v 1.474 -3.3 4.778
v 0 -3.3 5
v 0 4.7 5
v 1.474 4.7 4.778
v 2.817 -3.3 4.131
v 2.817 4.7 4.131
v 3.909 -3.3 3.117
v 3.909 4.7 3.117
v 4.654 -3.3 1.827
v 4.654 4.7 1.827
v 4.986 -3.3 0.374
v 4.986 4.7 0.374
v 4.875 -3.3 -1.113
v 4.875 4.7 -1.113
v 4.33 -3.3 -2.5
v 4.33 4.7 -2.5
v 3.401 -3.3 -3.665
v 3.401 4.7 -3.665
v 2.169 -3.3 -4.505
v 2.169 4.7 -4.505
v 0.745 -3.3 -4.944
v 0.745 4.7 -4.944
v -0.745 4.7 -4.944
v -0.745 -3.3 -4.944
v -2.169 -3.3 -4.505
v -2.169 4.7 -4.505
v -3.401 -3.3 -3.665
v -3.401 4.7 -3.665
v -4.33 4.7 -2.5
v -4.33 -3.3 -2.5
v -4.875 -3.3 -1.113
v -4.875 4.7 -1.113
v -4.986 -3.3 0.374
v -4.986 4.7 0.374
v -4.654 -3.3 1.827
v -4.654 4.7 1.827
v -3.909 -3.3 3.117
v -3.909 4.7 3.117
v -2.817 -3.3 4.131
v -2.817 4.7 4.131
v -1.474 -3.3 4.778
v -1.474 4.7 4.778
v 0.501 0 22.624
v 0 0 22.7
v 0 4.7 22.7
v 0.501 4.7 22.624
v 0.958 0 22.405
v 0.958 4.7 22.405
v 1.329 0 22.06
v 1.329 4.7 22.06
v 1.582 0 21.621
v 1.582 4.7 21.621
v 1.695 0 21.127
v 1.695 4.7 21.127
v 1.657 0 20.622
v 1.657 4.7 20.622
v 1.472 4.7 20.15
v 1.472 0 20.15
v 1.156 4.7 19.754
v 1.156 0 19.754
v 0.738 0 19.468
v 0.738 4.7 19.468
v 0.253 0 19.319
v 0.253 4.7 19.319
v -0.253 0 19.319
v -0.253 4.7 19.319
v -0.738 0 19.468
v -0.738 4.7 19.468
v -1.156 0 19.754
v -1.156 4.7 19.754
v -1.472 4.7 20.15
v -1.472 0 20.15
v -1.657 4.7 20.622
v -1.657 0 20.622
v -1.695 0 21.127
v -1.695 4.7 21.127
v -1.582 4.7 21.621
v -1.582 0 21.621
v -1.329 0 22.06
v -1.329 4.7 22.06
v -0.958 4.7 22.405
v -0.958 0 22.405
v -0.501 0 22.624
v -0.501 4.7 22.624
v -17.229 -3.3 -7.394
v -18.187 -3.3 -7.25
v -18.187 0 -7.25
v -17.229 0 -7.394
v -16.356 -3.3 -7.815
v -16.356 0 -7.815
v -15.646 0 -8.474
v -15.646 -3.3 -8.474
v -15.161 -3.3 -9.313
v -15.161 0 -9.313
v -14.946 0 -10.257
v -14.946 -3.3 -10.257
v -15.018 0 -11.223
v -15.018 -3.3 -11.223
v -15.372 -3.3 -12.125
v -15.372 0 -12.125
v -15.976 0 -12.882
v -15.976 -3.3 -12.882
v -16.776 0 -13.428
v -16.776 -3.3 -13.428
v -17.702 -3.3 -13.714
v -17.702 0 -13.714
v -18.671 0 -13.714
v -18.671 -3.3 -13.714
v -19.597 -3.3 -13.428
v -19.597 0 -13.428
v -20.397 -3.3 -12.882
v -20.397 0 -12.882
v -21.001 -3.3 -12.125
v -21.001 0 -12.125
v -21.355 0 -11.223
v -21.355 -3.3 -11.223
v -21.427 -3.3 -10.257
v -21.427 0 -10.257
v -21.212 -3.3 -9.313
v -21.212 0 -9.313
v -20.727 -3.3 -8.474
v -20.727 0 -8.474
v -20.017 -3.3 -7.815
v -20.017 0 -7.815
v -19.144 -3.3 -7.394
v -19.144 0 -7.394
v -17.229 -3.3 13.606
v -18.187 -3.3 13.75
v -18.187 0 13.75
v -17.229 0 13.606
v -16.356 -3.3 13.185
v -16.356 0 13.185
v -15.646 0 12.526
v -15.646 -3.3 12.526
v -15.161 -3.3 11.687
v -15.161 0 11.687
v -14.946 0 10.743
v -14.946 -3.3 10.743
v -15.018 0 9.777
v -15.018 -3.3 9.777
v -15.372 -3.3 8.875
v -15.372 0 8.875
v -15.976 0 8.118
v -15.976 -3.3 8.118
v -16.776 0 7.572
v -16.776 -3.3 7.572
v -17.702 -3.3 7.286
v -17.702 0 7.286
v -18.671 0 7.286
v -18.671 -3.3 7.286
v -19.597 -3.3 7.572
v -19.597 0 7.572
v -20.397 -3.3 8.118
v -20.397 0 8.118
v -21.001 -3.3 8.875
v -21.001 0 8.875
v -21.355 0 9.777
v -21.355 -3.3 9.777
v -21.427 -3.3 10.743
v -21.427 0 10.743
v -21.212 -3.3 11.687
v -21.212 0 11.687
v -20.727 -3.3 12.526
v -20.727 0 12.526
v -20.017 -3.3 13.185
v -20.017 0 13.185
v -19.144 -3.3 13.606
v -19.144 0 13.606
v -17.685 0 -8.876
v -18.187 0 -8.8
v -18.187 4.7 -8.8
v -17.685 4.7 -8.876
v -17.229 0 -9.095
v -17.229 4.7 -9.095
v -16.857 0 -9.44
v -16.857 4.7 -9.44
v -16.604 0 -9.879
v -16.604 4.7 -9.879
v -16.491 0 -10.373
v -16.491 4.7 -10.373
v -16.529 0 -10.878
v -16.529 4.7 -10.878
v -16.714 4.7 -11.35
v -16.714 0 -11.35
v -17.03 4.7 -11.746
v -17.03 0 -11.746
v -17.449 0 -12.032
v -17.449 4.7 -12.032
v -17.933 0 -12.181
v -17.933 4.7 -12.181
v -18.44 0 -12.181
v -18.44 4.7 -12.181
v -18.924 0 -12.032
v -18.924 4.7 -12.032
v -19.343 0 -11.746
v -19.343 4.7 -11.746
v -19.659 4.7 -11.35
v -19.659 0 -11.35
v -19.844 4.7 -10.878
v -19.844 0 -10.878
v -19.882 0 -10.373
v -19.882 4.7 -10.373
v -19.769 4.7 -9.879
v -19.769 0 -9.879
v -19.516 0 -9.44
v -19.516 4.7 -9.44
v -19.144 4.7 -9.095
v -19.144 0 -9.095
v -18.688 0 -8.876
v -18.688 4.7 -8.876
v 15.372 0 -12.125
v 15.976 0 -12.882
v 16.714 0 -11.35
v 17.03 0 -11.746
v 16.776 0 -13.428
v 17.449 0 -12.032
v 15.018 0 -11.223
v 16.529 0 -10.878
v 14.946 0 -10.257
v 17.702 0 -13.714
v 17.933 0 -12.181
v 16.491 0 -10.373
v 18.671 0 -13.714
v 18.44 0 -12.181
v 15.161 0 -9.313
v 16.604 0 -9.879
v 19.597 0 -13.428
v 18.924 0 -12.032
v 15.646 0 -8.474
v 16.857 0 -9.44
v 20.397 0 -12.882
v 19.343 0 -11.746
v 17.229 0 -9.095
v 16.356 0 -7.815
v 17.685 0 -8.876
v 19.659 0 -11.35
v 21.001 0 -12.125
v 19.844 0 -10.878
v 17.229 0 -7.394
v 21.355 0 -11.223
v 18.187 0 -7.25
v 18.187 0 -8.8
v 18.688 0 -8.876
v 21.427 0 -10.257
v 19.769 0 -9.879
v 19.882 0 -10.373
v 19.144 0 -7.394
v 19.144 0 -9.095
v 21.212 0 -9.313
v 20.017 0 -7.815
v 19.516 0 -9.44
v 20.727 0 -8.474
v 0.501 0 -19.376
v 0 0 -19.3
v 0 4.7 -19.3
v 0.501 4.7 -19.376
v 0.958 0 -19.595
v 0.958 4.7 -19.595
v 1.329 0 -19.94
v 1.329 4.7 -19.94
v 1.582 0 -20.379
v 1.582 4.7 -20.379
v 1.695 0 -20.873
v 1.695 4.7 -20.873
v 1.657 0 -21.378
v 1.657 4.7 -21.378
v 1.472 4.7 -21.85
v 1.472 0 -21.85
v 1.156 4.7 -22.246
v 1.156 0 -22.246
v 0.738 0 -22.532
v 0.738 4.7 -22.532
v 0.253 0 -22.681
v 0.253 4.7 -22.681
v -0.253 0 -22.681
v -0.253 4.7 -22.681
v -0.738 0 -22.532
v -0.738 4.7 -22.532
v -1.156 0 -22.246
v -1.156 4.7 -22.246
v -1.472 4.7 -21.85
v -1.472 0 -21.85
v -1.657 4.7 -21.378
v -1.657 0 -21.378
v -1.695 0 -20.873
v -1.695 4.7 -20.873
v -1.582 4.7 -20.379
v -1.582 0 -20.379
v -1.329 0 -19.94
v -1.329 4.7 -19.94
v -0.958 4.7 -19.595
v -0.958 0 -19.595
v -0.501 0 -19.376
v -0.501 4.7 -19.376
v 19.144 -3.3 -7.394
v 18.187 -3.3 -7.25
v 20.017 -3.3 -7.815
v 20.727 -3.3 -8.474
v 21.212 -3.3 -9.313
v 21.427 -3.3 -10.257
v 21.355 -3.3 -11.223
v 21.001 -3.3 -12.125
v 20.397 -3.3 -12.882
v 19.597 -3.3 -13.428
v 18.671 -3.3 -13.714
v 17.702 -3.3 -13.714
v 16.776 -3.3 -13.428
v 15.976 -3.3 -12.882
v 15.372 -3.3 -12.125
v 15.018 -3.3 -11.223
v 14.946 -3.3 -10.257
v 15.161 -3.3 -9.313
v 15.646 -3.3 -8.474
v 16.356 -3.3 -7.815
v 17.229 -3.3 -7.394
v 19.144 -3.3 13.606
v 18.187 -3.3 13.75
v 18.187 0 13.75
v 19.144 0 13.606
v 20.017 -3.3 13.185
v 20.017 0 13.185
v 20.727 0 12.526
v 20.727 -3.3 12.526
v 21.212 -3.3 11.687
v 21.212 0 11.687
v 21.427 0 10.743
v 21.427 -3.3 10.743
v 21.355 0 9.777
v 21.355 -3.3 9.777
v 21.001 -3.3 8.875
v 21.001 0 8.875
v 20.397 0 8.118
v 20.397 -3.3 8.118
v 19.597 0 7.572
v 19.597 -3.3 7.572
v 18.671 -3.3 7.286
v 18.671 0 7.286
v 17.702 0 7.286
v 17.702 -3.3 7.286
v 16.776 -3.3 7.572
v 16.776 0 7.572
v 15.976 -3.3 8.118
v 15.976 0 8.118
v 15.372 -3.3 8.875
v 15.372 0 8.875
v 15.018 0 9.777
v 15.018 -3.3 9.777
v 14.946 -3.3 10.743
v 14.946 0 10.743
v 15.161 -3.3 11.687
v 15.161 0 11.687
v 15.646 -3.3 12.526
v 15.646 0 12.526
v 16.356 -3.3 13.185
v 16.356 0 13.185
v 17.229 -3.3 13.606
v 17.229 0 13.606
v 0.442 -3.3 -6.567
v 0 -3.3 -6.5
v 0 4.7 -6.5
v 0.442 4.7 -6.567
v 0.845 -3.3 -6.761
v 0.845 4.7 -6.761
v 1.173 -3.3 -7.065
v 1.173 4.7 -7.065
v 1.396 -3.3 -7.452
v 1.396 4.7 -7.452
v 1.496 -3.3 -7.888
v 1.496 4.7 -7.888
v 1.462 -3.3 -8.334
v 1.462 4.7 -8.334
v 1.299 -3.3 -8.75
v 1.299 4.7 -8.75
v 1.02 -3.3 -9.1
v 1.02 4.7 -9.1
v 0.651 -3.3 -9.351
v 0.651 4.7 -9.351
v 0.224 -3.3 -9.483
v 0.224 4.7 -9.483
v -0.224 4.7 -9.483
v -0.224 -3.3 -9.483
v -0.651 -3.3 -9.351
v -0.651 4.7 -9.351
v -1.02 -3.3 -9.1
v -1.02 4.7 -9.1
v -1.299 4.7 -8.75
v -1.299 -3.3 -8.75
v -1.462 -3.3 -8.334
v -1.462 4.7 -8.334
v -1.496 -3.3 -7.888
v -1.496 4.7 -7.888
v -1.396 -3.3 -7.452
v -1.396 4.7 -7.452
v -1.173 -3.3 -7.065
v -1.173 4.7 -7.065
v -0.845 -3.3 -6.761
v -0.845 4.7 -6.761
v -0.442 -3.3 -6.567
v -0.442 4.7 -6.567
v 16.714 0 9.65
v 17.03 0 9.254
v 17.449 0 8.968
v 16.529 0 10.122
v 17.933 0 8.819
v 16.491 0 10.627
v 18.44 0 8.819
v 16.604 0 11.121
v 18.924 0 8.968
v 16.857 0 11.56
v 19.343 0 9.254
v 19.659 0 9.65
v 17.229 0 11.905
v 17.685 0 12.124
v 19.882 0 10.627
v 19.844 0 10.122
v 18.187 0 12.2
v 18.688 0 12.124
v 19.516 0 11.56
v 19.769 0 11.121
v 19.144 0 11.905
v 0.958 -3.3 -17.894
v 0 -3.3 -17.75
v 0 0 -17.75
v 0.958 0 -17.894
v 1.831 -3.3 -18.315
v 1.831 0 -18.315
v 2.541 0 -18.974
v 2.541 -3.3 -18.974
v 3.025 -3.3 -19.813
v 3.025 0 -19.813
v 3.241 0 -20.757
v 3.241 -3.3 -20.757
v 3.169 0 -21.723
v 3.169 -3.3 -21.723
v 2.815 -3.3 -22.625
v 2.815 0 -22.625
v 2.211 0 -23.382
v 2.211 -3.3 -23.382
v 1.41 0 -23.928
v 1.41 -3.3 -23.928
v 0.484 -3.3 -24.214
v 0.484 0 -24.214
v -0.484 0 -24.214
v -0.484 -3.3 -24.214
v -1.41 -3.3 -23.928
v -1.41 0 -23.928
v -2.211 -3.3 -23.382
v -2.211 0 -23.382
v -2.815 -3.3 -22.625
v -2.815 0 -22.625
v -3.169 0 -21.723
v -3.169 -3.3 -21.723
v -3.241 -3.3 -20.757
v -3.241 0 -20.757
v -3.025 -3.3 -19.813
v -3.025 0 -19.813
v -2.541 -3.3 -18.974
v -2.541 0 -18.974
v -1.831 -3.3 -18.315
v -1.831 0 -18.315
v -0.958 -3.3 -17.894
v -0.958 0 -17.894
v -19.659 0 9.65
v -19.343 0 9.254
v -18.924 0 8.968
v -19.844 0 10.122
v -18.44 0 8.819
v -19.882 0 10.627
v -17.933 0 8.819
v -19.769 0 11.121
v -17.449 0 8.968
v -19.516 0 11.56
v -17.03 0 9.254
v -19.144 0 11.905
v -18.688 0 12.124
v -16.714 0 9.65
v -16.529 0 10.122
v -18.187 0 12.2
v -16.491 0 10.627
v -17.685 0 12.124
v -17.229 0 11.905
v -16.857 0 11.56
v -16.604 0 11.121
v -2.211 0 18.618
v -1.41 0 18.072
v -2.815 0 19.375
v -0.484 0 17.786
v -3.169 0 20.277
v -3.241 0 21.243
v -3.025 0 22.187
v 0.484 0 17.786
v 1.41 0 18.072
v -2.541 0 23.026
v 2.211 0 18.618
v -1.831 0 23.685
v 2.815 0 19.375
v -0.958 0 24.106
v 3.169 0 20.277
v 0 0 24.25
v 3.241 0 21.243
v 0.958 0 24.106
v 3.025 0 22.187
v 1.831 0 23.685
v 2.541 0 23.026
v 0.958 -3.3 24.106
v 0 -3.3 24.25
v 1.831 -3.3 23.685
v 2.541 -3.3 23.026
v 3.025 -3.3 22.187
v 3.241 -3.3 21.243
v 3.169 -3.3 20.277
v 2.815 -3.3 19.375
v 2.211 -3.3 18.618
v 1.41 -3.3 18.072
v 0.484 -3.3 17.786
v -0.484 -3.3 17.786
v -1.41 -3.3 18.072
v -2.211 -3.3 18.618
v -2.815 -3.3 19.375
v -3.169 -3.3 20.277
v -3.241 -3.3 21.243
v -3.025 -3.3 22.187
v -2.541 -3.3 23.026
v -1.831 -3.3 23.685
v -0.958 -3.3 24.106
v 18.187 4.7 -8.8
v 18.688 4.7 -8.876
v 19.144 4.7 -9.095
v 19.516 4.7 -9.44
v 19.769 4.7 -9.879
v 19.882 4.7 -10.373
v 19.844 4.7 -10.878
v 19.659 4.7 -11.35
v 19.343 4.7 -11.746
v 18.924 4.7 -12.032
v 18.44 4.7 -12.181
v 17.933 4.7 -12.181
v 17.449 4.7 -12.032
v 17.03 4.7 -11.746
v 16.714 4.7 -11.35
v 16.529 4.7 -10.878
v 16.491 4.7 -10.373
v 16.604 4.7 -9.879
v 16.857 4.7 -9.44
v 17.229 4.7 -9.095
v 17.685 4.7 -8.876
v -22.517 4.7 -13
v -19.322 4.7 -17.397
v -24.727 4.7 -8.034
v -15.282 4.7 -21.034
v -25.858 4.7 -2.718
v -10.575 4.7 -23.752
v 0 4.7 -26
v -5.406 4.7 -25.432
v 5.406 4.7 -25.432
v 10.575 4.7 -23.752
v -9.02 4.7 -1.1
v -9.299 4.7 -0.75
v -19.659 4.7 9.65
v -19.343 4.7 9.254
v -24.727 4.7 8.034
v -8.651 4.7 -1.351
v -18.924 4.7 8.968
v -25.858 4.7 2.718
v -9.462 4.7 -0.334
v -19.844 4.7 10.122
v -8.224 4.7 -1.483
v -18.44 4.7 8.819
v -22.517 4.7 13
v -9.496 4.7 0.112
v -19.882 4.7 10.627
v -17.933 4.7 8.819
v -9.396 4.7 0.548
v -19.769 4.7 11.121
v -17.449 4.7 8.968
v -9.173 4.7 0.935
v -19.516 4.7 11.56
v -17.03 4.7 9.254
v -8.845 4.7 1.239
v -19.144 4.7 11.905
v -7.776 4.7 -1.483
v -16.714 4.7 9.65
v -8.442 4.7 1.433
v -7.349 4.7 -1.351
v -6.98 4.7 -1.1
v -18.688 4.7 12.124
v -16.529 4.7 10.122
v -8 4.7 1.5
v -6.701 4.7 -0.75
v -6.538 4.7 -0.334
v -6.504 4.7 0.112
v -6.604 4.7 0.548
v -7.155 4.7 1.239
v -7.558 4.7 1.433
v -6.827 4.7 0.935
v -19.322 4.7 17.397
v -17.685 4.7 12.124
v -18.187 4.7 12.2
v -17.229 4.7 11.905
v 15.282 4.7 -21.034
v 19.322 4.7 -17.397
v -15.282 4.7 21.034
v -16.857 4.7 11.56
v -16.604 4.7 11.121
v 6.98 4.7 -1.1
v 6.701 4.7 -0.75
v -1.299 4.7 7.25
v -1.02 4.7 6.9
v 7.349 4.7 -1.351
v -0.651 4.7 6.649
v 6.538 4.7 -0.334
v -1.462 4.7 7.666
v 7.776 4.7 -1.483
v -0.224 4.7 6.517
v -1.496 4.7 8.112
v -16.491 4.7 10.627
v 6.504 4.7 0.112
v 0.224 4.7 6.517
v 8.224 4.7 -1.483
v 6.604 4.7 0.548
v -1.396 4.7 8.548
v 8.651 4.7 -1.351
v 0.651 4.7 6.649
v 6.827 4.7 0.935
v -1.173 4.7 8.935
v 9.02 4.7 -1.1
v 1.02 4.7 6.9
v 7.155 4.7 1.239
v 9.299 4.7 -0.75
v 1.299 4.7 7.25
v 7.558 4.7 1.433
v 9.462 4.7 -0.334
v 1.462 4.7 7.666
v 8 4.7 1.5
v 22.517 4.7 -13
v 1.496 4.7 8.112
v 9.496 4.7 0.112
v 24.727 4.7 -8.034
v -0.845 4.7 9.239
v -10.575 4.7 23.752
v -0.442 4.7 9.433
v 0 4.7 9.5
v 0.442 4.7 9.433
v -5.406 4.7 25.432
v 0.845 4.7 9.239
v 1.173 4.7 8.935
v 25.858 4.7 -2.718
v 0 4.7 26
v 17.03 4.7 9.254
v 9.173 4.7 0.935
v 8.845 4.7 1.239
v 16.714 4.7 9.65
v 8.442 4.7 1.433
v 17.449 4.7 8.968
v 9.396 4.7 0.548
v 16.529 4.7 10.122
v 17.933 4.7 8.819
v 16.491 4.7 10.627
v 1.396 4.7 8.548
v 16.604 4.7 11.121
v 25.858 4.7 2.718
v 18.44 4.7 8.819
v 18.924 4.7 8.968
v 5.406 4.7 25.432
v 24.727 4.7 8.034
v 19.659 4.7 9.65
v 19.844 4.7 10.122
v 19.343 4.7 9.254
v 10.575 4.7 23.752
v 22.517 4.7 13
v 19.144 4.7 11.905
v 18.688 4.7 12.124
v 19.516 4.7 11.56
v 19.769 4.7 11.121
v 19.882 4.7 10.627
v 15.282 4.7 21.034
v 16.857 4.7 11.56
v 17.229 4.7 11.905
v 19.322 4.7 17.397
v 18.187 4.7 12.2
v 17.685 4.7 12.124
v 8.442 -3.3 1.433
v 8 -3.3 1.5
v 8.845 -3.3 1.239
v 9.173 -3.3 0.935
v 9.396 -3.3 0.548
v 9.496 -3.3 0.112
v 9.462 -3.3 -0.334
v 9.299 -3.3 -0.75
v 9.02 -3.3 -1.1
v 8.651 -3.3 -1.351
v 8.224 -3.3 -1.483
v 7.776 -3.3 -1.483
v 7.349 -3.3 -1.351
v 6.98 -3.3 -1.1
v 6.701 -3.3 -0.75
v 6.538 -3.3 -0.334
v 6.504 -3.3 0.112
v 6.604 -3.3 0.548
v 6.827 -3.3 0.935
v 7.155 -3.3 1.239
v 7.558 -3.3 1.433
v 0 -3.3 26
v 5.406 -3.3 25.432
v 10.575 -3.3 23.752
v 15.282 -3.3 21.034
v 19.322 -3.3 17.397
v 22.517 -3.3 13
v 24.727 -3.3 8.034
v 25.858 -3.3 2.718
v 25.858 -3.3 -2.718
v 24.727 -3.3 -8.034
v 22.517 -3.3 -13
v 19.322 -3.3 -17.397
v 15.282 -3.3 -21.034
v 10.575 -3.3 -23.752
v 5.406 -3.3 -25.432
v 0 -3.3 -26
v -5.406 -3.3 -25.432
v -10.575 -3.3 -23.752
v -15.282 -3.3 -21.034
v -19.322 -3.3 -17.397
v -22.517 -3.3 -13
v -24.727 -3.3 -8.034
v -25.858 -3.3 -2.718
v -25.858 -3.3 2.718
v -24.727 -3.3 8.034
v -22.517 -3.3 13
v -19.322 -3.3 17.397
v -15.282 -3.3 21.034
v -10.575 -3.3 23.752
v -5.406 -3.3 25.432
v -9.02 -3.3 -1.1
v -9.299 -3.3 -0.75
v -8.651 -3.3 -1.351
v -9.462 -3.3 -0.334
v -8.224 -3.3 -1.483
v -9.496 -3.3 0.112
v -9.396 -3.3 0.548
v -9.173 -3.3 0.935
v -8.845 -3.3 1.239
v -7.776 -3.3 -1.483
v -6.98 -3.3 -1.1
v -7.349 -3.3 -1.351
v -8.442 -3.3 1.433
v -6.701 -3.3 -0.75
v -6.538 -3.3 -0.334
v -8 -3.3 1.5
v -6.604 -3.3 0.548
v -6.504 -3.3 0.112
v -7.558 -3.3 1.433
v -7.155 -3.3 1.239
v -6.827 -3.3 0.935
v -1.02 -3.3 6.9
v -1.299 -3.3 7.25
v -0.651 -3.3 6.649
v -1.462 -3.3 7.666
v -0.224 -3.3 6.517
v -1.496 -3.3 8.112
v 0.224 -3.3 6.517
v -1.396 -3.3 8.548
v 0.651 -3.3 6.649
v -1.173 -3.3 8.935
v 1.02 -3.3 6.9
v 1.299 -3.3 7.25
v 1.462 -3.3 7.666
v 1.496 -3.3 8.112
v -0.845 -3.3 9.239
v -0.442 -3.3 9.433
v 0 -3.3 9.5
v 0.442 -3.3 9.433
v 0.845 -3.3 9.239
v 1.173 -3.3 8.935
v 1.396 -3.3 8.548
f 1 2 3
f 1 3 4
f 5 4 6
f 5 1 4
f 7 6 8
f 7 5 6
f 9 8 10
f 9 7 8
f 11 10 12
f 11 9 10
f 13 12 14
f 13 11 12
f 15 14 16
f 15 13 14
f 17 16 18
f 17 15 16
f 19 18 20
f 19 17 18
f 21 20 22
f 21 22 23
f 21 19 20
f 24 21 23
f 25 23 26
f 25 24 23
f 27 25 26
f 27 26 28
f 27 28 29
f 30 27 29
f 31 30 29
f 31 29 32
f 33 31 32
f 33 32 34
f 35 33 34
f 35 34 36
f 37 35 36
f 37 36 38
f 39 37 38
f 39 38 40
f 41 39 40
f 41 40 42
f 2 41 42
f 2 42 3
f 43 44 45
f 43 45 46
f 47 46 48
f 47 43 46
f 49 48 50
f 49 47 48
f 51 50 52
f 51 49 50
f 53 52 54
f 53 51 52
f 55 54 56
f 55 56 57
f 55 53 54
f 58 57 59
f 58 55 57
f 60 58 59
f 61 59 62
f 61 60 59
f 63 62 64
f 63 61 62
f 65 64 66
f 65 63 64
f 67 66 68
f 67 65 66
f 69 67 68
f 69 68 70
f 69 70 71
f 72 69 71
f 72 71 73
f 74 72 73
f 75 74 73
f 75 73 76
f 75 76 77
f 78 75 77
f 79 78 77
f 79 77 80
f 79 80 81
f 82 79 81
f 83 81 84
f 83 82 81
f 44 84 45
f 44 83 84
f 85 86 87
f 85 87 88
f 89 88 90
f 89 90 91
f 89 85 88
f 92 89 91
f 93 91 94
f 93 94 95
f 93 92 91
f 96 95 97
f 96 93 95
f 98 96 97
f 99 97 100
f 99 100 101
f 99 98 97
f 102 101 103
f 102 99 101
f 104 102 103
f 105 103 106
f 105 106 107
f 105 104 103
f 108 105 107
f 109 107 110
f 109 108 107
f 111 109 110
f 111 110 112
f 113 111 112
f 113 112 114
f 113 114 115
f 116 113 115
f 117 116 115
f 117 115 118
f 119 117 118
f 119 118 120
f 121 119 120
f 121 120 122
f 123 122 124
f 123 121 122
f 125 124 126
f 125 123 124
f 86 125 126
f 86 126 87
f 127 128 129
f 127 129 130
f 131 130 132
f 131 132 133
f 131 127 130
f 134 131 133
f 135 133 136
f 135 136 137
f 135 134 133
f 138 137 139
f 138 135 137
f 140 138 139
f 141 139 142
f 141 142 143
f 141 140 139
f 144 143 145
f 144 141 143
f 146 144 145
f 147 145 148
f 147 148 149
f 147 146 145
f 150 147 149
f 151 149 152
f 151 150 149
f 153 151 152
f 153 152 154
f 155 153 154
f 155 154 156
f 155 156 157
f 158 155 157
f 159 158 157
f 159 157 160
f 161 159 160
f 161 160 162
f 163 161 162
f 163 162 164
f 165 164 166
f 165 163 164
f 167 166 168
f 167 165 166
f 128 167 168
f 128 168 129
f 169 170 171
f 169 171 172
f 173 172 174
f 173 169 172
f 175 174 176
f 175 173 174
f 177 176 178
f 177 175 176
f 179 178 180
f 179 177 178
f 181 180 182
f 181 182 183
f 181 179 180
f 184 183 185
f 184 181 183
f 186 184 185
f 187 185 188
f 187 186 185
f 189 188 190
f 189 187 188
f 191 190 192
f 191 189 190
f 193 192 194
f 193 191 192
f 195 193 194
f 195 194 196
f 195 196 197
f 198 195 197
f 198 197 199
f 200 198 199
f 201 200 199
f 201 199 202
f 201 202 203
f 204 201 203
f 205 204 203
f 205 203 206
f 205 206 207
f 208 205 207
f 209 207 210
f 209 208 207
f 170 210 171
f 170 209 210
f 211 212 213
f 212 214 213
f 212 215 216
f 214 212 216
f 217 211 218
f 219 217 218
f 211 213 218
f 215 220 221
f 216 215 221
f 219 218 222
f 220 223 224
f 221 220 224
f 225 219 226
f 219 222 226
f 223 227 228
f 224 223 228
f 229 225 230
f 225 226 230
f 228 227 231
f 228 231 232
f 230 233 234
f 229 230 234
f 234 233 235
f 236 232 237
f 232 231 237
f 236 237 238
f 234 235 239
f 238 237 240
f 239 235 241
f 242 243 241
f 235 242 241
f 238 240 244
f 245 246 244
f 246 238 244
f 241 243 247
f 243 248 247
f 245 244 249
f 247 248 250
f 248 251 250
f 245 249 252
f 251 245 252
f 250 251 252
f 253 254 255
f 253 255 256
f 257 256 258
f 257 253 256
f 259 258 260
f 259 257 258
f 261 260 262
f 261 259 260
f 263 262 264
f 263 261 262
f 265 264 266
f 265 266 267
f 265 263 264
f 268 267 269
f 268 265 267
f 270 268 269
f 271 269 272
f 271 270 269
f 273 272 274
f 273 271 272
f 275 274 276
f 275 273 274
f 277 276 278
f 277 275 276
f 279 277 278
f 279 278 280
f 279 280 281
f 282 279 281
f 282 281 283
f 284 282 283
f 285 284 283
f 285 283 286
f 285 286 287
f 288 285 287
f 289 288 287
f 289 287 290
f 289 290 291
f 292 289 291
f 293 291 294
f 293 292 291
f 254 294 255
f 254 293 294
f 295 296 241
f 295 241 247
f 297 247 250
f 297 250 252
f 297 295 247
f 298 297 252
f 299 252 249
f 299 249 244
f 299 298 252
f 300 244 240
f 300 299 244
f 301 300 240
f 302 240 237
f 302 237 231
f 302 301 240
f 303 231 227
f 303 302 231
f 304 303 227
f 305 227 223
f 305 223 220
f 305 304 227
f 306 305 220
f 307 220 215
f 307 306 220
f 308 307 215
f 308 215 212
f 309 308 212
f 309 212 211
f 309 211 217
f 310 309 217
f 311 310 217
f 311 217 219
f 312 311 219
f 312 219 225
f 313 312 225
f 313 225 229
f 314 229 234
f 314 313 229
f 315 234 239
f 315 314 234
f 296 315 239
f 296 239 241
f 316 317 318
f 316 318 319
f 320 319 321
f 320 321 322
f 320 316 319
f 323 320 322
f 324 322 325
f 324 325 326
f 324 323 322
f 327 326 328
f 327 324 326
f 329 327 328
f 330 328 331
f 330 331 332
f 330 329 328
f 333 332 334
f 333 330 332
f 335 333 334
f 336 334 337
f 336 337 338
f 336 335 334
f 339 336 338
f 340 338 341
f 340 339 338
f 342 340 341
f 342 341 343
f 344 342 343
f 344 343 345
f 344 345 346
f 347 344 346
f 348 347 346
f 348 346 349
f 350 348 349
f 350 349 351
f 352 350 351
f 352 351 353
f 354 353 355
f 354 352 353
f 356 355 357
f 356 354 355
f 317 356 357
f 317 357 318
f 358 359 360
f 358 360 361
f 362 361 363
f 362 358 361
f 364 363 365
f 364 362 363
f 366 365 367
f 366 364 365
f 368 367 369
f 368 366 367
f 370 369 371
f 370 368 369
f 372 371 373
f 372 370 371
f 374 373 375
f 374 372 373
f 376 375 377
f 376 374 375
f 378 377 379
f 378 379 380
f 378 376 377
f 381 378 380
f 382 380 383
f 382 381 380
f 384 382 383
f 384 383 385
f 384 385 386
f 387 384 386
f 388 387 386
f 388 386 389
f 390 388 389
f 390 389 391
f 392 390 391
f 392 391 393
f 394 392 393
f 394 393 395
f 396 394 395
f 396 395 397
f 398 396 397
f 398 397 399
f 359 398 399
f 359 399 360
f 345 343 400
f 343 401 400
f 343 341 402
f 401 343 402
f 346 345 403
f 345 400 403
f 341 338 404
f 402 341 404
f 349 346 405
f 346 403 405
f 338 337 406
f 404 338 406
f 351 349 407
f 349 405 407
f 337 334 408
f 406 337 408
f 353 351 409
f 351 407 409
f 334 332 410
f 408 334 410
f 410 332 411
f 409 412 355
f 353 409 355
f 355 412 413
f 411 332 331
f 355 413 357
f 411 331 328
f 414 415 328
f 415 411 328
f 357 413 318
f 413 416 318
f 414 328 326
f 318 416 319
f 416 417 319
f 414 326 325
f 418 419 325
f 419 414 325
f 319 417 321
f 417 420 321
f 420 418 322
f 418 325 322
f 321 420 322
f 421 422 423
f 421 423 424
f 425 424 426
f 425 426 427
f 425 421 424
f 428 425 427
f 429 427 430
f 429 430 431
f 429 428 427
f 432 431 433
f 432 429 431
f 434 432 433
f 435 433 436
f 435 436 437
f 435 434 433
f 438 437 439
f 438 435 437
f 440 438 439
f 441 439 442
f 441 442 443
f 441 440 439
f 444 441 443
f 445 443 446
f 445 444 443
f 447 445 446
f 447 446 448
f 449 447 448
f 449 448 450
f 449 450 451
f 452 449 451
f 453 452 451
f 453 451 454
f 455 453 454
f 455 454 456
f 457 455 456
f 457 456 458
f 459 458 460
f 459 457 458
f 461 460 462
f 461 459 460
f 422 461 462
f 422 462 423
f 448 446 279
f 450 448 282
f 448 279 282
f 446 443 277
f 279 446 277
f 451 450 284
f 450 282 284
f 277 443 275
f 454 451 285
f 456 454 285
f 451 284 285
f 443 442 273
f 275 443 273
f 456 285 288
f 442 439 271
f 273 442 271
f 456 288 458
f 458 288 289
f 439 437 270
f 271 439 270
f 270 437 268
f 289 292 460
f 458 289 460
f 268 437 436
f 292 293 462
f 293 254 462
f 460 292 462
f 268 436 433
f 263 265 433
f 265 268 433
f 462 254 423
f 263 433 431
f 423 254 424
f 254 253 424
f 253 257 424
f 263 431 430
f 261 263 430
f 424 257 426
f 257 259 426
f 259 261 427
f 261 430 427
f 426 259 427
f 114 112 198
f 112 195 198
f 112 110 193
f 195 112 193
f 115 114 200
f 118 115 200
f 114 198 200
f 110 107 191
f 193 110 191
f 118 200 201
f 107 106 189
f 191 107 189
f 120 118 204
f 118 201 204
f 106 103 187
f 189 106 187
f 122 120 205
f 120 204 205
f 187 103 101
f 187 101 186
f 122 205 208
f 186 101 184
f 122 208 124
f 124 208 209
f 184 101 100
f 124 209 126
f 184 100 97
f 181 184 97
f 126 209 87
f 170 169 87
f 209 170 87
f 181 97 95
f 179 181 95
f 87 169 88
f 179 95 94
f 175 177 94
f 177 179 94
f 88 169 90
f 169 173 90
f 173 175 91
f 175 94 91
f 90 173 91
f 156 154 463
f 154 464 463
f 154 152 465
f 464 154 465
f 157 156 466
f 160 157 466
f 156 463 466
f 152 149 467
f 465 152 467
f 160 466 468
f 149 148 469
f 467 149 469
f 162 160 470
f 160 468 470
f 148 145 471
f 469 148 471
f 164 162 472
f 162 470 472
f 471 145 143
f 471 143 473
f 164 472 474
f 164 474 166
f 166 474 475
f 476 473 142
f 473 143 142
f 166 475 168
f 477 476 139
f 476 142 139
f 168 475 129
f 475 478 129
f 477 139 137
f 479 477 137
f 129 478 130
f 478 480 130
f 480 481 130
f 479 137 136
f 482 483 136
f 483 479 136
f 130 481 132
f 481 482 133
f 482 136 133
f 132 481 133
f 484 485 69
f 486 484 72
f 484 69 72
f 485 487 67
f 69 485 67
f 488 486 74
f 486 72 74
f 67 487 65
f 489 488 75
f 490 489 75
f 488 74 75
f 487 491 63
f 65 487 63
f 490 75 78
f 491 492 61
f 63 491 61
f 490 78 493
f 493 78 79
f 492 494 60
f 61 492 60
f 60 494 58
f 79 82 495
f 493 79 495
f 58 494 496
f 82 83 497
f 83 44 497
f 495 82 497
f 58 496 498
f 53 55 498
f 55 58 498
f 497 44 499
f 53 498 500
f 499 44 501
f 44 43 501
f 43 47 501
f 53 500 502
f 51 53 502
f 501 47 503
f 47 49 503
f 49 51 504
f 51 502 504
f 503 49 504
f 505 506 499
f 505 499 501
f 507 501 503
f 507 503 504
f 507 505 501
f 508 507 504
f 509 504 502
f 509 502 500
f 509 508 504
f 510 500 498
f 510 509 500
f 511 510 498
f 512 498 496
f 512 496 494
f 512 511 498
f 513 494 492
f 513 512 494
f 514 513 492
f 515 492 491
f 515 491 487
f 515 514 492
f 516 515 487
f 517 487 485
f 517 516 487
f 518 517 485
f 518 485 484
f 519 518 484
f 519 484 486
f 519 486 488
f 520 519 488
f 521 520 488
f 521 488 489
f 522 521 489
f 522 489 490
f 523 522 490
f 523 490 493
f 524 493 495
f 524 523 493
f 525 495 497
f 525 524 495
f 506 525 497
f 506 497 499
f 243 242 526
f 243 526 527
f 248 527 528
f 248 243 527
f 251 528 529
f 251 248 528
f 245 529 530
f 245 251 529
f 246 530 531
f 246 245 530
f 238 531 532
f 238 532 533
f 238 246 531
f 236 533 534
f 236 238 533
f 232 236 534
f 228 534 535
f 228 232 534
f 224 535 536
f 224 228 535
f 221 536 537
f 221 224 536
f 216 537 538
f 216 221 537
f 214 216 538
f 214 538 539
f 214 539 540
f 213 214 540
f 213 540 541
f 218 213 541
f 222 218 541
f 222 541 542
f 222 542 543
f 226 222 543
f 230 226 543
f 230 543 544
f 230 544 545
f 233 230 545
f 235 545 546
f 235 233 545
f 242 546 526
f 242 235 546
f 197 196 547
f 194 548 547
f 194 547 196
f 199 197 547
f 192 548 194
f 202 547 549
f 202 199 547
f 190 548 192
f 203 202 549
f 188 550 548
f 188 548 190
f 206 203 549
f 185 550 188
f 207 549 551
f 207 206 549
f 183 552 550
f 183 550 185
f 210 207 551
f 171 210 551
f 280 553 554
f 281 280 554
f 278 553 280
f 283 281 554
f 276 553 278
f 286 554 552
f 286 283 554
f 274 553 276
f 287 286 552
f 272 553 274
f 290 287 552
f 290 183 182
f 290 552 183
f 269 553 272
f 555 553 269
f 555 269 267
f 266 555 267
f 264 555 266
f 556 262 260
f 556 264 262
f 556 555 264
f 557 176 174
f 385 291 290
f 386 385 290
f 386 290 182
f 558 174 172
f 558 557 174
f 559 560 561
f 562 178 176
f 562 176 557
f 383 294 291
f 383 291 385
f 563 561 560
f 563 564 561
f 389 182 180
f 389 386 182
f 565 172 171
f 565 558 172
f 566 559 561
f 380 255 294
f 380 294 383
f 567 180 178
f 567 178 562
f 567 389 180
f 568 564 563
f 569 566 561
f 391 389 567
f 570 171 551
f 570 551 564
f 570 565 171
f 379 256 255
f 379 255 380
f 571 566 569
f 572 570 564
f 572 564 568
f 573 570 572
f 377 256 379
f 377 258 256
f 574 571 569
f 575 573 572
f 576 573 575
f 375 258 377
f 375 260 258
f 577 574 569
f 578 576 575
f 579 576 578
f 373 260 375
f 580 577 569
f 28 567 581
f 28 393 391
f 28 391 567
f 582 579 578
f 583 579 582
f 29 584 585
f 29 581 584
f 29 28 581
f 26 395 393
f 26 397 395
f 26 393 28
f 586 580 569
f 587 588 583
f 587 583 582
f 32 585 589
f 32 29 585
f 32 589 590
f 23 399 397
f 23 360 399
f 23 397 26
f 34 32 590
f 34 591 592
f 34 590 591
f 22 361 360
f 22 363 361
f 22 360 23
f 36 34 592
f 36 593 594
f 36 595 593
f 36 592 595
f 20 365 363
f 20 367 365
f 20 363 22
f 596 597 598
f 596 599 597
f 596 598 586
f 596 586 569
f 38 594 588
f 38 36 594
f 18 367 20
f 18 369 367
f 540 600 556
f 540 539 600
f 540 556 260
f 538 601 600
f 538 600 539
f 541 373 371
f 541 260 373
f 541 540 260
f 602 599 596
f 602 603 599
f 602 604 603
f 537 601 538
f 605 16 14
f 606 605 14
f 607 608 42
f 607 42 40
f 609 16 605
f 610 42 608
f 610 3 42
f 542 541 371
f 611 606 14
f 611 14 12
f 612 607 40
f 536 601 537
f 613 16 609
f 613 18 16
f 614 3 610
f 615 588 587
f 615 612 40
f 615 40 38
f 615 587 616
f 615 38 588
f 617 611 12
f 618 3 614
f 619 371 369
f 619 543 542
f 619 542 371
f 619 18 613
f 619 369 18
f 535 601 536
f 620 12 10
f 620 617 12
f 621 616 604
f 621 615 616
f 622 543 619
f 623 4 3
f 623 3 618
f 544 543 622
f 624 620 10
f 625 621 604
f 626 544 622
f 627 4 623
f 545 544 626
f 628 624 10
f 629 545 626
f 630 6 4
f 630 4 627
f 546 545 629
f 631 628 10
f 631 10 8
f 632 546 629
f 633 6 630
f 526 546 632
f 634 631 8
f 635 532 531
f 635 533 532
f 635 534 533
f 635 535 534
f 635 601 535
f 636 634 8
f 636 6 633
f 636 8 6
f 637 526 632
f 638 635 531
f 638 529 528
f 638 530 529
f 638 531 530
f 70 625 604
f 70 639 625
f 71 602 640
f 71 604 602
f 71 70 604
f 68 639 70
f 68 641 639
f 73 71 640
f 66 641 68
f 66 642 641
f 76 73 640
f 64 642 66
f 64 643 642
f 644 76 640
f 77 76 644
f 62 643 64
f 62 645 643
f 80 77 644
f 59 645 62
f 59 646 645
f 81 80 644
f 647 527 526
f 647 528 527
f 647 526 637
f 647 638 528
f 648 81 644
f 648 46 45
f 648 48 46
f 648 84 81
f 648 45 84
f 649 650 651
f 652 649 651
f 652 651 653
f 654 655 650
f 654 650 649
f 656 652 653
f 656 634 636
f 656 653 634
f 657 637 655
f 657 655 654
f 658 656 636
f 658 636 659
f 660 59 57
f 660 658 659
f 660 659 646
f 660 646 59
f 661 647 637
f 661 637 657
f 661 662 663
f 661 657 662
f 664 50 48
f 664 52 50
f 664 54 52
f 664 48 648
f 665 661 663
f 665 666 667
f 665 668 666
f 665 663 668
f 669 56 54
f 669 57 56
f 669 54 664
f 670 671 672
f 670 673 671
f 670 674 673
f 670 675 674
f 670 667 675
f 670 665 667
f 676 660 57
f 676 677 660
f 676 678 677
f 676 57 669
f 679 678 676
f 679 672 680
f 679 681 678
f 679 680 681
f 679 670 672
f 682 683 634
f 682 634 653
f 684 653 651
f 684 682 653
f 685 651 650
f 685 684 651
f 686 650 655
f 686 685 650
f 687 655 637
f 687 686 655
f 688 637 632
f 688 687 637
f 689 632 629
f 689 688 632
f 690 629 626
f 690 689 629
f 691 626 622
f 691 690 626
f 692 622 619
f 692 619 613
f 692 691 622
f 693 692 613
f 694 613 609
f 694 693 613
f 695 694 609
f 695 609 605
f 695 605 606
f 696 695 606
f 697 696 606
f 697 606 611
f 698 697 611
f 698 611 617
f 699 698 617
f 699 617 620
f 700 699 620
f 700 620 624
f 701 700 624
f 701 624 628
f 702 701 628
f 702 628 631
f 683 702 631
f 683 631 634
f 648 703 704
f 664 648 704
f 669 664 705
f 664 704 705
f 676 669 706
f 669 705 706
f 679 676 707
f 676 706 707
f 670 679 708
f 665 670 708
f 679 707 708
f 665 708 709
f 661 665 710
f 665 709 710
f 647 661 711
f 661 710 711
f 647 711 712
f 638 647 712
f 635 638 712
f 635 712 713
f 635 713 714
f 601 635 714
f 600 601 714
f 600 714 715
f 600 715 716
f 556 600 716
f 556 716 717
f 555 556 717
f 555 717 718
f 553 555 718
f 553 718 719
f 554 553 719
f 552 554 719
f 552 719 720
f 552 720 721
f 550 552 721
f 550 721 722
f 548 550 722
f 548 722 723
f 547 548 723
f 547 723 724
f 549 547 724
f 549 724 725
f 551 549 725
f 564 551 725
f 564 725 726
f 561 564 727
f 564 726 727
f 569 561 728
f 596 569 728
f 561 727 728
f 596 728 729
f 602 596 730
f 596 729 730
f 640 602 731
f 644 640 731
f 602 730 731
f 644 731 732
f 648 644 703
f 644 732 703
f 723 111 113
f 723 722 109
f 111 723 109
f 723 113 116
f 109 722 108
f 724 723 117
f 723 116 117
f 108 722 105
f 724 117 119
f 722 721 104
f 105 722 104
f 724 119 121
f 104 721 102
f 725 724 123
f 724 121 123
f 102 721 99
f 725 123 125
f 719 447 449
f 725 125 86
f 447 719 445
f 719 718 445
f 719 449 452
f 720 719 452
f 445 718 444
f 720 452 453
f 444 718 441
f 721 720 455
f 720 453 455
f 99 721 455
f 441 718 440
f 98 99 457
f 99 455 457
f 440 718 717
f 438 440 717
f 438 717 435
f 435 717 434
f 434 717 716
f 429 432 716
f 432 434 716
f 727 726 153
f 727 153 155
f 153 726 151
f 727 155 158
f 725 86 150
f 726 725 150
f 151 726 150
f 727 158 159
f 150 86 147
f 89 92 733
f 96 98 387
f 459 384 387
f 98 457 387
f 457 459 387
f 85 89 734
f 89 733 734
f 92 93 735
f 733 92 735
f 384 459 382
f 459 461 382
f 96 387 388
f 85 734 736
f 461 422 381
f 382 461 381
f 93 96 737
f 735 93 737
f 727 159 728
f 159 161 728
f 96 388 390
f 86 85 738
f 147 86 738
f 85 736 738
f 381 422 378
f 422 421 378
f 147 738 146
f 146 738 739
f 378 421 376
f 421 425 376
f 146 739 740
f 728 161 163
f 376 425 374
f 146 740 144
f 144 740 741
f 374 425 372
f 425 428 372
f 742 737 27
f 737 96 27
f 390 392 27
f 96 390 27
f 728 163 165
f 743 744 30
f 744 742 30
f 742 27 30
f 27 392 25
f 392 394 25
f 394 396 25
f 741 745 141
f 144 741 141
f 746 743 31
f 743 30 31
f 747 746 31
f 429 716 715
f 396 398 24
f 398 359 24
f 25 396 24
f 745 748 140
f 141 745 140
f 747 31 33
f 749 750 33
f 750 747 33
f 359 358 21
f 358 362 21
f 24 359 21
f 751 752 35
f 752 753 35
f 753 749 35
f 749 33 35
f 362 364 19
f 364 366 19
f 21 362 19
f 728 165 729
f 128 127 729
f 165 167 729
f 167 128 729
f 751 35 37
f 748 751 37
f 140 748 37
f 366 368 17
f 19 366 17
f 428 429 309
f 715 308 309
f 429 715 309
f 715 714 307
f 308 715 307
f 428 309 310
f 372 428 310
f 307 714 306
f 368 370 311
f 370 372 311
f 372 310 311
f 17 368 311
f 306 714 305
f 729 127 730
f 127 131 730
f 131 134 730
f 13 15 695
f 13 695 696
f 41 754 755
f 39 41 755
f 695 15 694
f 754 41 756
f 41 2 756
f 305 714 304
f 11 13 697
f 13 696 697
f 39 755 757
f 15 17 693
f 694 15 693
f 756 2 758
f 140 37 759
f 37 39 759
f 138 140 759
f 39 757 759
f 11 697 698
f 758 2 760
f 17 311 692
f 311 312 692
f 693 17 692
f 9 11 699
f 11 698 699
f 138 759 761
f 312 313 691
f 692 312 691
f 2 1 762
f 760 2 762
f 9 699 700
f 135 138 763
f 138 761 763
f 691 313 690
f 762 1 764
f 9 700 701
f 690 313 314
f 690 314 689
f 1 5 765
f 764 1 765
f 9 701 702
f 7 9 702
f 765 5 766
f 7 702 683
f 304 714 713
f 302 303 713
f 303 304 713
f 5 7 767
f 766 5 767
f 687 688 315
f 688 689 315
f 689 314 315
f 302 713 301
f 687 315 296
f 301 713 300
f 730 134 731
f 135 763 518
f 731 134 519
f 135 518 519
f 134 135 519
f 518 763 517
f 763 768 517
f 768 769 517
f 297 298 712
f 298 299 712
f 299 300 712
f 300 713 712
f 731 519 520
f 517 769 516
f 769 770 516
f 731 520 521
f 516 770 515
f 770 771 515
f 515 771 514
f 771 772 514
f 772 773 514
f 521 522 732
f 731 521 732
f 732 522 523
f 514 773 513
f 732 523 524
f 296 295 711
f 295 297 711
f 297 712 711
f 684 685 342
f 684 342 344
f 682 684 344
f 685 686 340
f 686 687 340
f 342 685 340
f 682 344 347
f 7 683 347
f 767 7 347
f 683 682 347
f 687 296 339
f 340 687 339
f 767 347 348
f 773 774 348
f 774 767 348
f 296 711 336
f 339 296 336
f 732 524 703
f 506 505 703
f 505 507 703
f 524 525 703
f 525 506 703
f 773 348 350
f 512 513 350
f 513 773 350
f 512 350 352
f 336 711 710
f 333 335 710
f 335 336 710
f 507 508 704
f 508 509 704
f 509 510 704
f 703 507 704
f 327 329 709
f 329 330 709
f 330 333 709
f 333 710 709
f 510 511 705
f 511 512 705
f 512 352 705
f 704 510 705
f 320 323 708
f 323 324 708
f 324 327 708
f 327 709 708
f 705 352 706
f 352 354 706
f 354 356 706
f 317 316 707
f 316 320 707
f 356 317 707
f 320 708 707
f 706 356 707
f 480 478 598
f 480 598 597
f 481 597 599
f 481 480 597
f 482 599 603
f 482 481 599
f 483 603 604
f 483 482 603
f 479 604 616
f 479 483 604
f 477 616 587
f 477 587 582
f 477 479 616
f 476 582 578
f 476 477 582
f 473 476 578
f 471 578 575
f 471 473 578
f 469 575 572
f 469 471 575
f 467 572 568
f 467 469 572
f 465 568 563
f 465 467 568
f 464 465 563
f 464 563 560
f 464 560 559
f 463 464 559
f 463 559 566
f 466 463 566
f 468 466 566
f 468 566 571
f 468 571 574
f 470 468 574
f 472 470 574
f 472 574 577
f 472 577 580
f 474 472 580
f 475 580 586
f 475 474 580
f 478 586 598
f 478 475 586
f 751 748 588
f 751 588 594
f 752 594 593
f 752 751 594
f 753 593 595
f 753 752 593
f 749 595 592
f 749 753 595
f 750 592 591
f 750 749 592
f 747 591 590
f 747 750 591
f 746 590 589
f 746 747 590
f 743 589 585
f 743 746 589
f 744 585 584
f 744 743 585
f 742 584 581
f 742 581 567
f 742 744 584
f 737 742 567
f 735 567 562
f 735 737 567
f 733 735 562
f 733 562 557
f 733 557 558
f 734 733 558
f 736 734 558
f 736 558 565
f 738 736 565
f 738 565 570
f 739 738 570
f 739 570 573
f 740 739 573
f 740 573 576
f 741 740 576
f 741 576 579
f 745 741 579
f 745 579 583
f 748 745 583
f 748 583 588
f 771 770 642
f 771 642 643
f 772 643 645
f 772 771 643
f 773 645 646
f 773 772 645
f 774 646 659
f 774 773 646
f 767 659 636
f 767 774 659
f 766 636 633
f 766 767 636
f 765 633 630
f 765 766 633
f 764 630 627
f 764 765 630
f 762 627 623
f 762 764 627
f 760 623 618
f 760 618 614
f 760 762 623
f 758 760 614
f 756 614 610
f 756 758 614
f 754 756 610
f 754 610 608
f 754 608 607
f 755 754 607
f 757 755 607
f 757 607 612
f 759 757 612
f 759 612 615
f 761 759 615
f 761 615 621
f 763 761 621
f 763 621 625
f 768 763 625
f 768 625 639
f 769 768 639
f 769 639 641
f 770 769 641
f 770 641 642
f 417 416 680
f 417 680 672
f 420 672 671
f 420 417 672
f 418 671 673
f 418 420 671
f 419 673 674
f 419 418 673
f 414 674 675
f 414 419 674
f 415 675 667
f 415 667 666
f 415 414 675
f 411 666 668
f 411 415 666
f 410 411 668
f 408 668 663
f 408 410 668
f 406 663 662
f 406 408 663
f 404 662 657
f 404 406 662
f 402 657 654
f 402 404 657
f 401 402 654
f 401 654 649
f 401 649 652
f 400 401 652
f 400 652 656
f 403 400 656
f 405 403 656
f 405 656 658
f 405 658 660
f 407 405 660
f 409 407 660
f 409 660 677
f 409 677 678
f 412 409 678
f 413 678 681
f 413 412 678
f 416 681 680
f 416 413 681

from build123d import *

# Parameters (mm, degrees)
SKETCH1_R           = 26
SKETCH1_R_2         = 1.5
SKETCH1_R_3         = 5
SKETCH1_R_4         = 1.7
BOSS_EXTRUDE1_DEPTH = 4.7
BOSS_EXTRUDE2_START = -3.3
SKETCH1_3_R         = 26
SKETCH1_3_R_2       = 3.25
SKETCH1_3_R_3       = 1.5
SKETCH1_3_R_4       = 5
BOSS_EXTRUDE2_DEPTH = 3.3


with BuildPart() as part:
    # Sketch1 → Boss-Extrude1 (new body)
    with BuildSketch(Plane(origin=(0, 0, 0), x_dir=(1, 0, 0), z_dir=(0, 1, 0))):
        Circle(SKETCH1_R)
        with Locations((0, -8)):
            Circle(SKETCH1_R_2, mode=Mode.SUBTRACT)
        with Locations((8, 0)):
            Circle(SKETCH1_R_2, mode=Mode.SUBTRACT)
        with Locations((-8, 0)):
            Circle(SKETCH1_R_2, mode=Mode.SUBTRACT)
        Circle(SKETCH1_R_3, mode=Mode.SUBTRACT)
        with Locations((0, 8)):
            Circle(SKETCH1_R_2, mode=Mode.SUBTRACT)
        with Locations((0, -21)):
            Circle(SKETCH1_R_4, mode=Mode.SUBTRACT)
        with Locations((-18.186533479, -10.5)):
            Circle(SKETCH1_R_4, mode=Mode.SUBTRACT)
        with Locations((18.186533479, -10.5)):
            Circle(SKETCH1_R_4, mode=Mode.SUBTRACT)
        with Locations((-18.186533479, 10.5)):
            Circle(SKETCH1_R_4, mode=Mode.SUBTRACT)
        with Locations((18.186533479, 10.5)):
            Circle(SKETCH1_R_4, mode=Mode.SUBTRACT)
        with Locations((0, 21)):
            Circle(SKETCH1_R_4, mode=Mode.SUBTRACT)
    extrude(amount=BOSS_EXTRUDE1_DEPTH)

    # Sketch1<3> → Boss-Extrude2 (add)
    with BuildSketch(Plane(origin=(0, 0, 0), x_dir=(1, 0, 0), z_dir=(0, 1, 0)).offset(BOSS_EXTRUDE2_START)):
        Circle(SKETCH1_3_R)
        with Locations((0, -21)):
            Circle(SKETCH1_3_R_2, mode=Mode.SUBTRACT)
        with Locations((-18.186533479, -10.5)):
            Circle(SKETCH1_3_R_2, mode=Mode.SUBTRACT)
        with Locations((0, -8)):
            Circle(SKETCH1_3_R_3, mode=Mode.SUBTRACT)
        with Locations((8, 0)):
            Circle(SKETCH1_3_R_3, mode=Mode.SUBTRACT)
        with Locations((18.186533479, -10.5)):
            Circle(SKETCH1_3_R_2, mode=Mode.SUBTRACT)
        with Locations((-18.186533479, 10.5)):
            Circle(SKETCH1_3_R_2, mode=Mode.SUBTRACT)
        with Locations((-8, 0)):
            Circle(SKETCH1_3_R_3, mode=Mode.SUBTRACT)
        Circle(SKETCH1_3_R_4, mode=Mode.SUBTRACT)
        with Locations((0, 8)):
            Circle(SKETCH1_3_R_3, mode=Mode.SUBTRACT)
        with Locations((18.186533479, 10.5)):
            Circle(SKETCH1_3_R_2, mode=Mode.SUBTRACT)
        with Locations((0, 21)):
            Circle(SKETCH1_3_R_2, mode=Mode.SUBTRACT)
    extrude(amount=BOSS_EXTRUDE2_DEPTH)


solid = part.part
